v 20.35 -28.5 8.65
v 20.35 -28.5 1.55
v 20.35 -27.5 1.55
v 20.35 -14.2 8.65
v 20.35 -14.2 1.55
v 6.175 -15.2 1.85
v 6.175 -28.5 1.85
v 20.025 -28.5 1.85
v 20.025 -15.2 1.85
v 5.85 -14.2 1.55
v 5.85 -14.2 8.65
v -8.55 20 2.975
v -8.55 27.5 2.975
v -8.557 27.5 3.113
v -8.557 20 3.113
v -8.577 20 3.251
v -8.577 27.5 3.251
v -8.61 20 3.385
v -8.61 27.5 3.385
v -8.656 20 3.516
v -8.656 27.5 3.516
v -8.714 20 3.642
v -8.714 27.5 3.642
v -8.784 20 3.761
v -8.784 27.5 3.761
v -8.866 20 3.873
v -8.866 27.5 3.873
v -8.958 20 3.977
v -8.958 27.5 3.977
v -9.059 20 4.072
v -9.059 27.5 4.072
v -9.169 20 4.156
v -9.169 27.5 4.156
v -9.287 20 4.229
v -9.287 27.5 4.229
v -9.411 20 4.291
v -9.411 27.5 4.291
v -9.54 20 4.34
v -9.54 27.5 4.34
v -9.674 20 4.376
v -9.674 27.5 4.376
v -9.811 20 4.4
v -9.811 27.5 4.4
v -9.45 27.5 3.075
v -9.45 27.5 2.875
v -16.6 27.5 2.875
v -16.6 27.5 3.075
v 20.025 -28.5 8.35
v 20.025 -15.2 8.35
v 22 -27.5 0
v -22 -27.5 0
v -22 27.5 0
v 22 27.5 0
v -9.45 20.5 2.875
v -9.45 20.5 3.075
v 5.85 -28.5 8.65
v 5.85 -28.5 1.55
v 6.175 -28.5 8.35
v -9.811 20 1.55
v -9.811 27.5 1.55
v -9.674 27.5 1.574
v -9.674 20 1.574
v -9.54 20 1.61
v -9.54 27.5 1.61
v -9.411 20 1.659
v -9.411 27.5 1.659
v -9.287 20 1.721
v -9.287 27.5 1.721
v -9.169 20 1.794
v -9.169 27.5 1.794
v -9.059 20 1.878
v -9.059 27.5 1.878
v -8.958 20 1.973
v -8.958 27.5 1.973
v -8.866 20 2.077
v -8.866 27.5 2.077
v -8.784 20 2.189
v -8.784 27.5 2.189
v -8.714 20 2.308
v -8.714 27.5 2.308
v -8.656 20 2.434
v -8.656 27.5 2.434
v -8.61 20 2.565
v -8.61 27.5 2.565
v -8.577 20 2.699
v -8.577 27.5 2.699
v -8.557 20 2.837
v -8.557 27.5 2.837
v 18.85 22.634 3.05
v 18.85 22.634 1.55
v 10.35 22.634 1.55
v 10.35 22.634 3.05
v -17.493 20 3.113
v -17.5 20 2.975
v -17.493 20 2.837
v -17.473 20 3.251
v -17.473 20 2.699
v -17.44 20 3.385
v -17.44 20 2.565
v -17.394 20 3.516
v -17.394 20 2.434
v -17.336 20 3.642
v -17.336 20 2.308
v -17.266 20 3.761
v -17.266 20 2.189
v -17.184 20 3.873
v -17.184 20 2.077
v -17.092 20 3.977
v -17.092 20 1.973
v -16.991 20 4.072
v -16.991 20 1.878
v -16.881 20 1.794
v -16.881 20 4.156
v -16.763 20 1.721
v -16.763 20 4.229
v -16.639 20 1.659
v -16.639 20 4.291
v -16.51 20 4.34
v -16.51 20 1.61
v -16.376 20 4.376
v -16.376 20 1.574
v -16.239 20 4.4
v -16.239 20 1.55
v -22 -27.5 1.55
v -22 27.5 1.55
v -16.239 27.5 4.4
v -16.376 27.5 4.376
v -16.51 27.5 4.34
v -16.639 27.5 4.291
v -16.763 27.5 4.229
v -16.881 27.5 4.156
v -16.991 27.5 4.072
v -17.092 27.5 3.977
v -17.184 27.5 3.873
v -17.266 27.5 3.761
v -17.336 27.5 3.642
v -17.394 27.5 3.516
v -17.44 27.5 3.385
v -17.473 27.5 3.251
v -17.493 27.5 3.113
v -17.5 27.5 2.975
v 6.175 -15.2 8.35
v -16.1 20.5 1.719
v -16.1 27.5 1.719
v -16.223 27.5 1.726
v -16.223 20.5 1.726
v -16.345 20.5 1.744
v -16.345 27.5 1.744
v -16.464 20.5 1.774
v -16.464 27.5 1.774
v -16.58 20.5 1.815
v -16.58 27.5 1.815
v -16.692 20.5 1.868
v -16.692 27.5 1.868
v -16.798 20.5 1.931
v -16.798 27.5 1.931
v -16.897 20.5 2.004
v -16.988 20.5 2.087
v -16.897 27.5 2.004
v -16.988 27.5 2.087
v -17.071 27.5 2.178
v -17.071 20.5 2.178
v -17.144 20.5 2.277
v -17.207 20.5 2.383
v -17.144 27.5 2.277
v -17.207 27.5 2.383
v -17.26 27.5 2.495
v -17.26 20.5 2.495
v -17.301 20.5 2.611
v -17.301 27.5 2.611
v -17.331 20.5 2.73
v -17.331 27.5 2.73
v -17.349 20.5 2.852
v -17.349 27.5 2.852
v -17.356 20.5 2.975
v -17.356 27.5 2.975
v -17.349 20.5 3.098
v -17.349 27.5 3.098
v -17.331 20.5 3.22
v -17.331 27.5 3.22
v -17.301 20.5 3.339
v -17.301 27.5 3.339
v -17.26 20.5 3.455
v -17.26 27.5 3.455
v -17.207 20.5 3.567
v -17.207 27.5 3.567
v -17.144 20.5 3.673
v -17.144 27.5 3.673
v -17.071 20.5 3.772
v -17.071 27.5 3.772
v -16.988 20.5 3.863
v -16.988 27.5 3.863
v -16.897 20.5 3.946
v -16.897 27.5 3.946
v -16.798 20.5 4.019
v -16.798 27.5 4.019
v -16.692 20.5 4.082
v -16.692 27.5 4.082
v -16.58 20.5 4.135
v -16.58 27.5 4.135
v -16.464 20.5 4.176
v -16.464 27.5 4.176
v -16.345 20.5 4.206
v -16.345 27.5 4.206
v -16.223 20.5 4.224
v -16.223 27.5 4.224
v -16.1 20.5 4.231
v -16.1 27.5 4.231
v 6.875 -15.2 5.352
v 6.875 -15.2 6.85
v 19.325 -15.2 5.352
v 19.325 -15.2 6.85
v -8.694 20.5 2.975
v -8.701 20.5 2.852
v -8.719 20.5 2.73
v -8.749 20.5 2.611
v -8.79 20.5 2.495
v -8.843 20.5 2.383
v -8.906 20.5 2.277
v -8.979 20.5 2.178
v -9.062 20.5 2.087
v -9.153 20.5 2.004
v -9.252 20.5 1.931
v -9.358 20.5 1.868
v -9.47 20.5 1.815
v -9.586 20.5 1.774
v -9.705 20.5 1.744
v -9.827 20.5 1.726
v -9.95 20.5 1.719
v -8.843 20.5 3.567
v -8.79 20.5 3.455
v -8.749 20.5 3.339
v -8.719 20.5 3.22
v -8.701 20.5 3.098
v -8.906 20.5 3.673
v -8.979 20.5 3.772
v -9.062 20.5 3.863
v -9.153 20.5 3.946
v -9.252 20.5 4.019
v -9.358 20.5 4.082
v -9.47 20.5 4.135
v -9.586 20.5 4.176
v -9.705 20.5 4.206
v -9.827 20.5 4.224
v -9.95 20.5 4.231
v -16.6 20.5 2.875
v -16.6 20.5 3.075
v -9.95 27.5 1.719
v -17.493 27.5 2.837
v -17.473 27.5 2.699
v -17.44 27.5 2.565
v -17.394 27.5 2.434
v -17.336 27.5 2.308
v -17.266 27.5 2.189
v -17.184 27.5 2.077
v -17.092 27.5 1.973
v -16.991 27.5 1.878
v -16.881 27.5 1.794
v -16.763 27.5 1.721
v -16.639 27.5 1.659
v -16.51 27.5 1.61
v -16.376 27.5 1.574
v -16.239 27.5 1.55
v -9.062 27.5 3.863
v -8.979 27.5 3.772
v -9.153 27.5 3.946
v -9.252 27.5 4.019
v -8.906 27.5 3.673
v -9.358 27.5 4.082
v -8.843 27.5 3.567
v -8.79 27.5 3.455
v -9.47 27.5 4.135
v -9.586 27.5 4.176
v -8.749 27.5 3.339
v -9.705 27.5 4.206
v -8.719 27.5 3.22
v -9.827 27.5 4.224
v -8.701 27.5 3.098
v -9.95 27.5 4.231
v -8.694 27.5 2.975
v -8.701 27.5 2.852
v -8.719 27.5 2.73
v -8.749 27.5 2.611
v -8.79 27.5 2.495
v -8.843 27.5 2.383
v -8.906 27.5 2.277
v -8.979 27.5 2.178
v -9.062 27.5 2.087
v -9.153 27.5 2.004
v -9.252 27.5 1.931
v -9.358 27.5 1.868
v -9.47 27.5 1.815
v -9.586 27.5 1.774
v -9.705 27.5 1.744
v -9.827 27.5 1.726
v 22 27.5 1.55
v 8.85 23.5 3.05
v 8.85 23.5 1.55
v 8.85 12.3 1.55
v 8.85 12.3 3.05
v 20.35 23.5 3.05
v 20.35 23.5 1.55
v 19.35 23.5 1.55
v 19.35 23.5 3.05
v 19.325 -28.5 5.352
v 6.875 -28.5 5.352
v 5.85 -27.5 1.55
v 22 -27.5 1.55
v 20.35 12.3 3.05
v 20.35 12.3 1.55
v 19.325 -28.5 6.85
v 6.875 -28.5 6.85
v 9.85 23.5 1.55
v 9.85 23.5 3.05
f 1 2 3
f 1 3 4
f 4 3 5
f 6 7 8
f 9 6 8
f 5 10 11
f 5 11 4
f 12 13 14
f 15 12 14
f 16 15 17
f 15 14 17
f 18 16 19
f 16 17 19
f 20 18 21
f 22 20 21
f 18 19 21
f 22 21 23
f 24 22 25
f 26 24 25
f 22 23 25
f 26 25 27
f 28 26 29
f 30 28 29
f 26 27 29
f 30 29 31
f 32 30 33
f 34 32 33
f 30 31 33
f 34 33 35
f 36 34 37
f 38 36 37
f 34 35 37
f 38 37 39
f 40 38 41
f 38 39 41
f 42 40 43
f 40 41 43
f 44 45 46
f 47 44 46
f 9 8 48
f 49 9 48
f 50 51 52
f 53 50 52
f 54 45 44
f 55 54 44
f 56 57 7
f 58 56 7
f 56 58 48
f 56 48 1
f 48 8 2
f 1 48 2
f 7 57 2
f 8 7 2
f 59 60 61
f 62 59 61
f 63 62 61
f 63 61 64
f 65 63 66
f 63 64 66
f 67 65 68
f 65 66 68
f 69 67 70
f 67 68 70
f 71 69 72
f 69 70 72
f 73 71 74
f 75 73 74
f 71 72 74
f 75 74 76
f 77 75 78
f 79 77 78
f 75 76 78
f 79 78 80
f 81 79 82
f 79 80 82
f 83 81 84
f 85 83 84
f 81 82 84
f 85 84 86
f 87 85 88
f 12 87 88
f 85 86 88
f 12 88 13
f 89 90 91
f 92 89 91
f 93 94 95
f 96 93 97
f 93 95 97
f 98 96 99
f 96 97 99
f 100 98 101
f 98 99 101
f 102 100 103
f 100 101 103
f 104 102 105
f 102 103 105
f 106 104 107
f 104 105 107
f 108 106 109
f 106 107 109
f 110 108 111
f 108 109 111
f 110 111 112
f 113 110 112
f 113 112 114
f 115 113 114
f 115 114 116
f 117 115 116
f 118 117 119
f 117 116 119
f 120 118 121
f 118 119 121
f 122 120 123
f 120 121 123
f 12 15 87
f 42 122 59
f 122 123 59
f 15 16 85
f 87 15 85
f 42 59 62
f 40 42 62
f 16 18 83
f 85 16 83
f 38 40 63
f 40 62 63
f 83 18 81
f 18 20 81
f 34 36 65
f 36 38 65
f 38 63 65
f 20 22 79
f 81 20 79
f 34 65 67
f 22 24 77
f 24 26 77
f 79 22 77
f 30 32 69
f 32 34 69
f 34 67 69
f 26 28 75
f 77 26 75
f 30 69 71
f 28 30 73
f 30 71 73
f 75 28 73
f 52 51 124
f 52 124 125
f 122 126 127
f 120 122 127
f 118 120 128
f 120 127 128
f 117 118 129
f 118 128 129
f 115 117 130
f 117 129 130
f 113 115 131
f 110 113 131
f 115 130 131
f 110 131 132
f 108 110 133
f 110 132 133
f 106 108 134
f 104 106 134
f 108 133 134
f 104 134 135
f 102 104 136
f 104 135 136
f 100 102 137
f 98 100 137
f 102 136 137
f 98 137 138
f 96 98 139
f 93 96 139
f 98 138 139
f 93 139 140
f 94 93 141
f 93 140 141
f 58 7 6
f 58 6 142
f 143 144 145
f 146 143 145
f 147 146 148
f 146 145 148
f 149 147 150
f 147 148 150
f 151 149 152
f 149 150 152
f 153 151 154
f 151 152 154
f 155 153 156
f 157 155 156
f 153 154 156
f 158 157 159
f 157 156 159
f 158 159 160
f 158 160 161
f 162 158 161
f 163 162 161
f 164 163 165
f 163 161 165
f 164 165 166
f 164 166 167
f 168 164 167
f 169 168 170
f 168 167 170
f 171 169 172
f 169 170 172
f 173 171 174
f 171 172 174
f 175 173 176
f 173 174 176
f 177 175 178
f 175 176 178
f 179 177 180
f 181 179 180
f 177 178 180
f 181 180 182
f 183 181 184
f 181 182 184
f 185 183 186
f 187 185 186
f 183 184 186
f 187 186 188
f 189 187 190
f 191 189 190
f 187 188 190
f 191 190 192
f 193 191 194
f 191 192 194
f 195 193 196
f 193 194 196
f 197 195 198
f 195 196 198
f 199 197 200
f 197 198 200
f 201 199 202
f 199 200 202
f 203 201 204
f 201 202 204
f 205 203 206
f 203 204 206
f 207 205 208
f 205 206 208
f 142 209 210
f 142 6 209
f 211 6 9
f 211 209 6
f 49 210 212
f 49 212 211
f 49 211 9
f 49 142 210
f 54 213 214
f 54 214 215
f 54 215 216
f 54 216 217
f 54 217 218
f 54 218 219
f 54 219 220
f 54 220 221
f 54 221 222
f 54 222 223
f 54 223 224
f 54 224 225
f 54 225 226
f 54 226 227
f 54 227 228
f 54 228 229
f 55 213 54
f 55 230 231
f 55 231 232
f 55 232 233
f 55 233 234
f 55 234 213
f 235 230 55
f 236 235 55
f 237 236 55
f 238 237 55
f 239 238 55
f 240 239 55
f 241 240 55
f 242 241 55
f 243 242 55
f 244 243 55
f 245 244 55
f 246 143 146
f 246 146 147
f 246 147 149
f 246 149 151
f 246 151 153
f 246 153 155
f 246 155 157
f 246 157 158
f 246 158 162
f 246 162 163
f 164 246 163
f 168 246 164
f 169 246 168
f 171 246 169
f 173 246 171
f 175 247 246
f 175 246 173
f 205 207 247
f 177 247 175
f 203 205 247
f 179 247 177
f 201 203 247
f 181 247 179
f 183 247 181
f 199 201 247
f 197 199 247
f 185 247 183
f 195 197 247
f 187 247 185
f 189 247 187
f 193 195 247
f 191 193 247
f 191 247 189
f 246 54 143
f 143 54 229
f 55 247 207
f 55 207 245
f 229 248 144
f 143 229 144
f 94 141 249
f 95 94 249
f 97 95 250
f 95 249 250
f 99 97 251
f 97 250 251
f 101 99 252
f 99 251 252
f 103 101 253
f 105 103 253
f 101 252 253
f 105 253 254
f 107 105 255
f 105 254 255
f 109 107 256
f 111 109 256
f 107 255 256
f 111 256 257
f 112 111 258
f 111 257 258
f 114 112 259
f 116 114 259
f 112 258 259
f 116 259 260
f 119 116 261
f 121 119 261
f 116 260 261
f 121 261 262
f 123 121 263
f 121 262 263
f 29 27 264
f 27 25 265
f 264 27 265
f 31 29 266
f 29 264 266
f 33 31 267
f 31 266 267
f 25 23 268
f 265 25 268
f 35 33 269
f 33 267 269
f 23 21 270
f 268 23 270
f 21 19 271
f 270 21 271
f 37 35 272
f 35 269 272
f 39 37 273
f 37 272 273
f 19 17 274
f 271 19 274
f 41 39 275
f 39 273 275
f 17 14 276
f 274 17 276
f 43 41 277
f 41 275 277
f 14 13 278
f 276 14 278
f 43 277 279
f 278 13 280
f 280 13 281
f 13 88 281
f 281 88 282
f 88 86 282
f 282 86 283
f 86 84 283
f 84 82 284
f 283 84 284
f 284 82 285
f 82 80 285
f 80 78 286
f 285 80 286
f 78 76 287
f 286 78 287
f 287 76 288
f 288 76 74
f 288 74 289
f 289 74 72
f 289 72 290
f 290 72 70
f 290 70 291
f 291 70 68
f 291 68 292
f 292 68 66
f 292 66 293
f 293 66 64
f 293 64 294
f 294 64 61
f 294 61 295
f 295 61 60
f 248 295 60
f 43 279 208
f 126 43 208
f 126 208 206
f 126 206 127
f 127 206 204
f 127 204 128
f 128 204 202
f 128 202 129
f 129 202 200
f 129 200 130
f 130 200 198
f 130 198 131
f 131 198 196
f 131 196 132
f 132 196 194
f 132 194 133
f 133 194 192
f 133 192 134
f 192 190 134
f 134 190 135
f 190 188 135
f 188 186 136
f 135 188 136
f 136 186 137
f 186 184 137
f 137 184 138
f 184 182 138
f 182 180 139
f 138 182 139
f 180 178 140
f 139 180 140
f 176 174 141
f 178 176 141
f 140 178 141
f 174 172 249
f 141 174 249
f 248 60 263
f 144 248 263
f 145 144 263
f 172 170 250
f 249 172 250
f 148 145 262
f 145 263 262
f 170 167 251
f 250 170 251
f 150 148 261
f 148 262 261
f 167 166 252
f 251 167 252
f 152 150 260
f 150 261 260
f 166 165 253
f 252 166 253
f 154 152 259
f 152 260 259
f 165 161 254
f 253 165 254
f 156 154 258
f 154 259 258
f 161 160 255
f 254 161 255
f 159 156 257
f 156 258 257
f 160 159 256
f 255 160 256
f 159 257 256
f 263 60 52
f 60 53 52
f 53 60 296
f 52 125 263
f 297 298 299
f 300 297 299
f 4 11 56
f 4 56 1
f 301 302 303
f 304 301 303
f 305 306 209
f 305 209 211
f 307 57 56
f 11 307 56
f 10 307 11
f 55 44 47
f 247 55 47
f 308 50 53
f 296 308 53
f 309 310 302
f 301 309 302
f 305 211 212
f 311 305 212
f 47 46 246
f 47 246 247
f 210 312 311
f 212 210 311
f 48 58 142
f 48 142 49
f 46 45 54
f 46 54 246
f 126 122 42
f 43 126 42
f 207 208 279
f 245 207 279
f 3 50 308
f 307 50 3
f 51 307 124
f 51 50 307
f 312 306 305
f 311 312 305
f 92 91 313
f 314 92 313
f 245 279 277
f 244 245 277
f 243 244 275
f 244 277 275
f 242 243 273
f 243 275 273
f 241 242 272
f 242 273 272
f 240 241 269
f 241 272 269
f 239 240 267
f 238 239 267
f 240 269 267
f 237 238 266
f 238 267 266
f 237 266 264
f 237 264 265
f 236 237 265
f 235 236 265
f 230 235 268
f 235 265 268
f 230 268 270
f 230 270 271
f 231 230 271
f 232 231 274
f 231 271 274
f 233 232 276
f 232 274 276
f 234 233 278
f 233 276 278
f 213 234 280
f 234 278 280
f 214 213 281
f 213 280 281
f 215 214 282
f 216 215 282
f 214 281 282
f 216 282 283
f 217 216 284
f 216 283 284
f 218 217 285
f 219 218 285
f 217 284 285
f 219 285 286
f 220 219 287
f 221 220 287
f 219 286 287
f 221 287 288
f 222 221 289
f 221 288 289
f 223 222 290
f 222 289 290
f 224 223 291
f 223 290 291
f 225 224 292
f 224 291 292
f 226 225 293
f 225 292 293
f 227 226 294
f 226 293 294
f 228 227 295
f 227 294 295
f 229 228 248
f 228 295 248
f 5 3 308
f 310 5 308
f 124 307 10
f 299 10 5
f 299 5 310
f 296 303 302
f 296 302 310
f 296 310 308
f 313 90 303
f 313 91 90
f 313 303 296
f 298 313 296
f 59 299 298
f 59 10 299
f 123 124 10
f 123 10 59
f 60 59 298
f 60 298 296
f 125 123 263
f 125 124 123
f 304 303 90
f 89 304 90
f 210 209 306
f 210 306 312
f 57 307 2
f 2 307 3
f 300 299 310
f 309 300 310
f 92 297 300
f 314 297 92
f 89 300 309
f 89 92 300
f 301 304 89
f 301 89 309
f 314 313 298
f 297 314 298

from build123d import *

# Parameters (mm, degrees)
SKETCH1_W           = 55
SKETCH1_H           = 44
BOSS_EXTRUDE1_DEPTH = 1.55
SKETCH2_W           = 14.5
SKETCH2_H           = 14.3
BOSS_EXTRUDE2_DEPTH = 7.1
SKETCH3_W           = 13.85
SKETCH3_H           = 6.5
SKETCH3_W_2         = 12.45
SKETCH3_H_2         = 1.497681088
CUT_EXTRUDE1_DEPTH  = 13.3
SKETCH4_W           = 8.95
SKETCH4_H           = 7.5
BOSS_EXTRUDE3_DEPTH = 2.85
CUT_EXTRUDE2_DEPTH  = 7.5
SKETCH5_3_W         = 7.15
SKETCH5_3_H         = 0.2
CUT_EXTRUDE3_DEPTH  = 7
BOSS_EXTRUDE4_DEPTH = 1.5


with BuildPart() as part:
    # Sketch1 → Boss-Extrude1 (new body)
    with BuildSketch(Plane(origin=(0, 0, 0), x_dir=(0, 1, 0), z_dir=(0, 0, 1))):
        Rectangle(SKETCH1_W, SKETCH1_H)
    extrude(amount=BOSS_EXTRUDE1_DEPTH)

    # Sketch2 → Boss-Extrude2 (add)
    with BuildSketch(Plane.XY.offset(1.55)):
        with Locations((13.1, -21.35)):
            Rectangle(SKETCH2_W, SKETCH2_H)
    extrude(amount=BOSS_EXTRUDE2_DEPTH)

    # Sketch3 → Cut-Extrude1 (cut)
    with BuildSketch(Plane.XZ.offset(28.5)):
        with Locations((13.1, 5.1)):
            Rectangle(SKETCH3_W, SKETCH3_H)
        with Locations((13.1, 6.101159456)):
            Rectangle(SKETCH3_W_2, SKETCH3_H_2, mode=Mode.SUBTRACT)
    extrude(amount=-CUT_EXTRUDE1_DEPTH, mode=Mode.SUBTRACT)

    # Sketch4 → Boss-Extrude3 (add)
    with BuildSketch(Plane.XY.offset(1.55)):
        with Locations((-13.025, 23.75)):
            Rectangle(SKETCH4_W, SKETCH4_H)
    extrude(amount=BOSS_EXTRUDE3_DEPTH)

    # Sketch5 → Cut-Extrude2 (cut)
    with BuildSketch(Plane(origin=(0, 27.5, 0), x_dir=(-1, 0, 0), z_dir=(0, 1, 0))):
        with BuildLine():
            Line((8.55, 4.4), (8.55, 2.975))
            ThreePointArc((8.55, 2.975), (8.910359128, 3.926260685), (9.810540583, 4.4))
            Line((9.810540583, 4.4), (8.55, 4.4))
        make_face()
        with BuildLine():
            Line((8.55, 1.55), (9.810540583, 1.55))
            ThreePointArc((9.810540583, 1.55), (8.910359128, 2.023739315), (8.55, 2.975))
            Line((8.55, 2.975), (8.55, 1.55))
        make_face()
        with BuildLine():
            Line((17.5, 1.55), (17.5, 2.975))
            ThreePointArc((17.5, 2.975), (17.139640872, 2.023739315), (16.239459417, 1.55))
            Line((16.239459417, 1.55), (17.5, 1.55))
        make_face()
        with BuildLine():
            Line((17.5, 4.4), (16.239459417, 4.4))
            ThreePointArc((16.239459417, 4.4), (17.139640872, 3.926260685), (17.5, 2.975))
            Line((17.5, 2.975), (17.5, 4.4))
        make_face()
    extrude(amount=-CUT_EXTRUDE2_DEPTH, mode=Mode.SUBTRACT)

    # Sketch5<3> → Cut-Extrude3 (cut)
    with BuildSketch(Plane(origin=(0, 27.5, 0), x_dir=(-1, 0, 0), z_dir=(0, 1, 0))):
        with BuildLine():
            Line((9.95, 1.719461162), (16.1, 1.719461162))
            ThreePointArc((16.1, 1.719461162), (17.355538838, 2.975), (16.1, 4.230538838))
            Line((16.1, 4.230538838), (9.95, 4.230538838))
            ThreePointArc((9.95, 4.230538838), (8.694461162, 2.975), (9.95, 1.719461162))
        make_face()
        with Locations((13.025, 2.975)):
            Rectangle(SKETCH5_3_W, SKETCH5_3_H, mode=Mode.SUBTRACT)
    extrude(amount=-CUT_EXTRUDE3_DEPTH, mode=Mode.SUBTRACT)

    # Sketch6 → Boss-Extrude4 (add)
    with BuildSketch(Plane.XY.offset(1.55)):
        Polygon((19.35, 23.5), (18.85, 22.633974596), (10.35, 22.633974596), (9.85, 23.5), (8.85, 23.5), (8.85, 12.3), (20.35, 12.3), (20.35, 23.5), align=None)
    extrude(amount=BOSS_EXTRUDE4_DEPTH)


solid = part.part
